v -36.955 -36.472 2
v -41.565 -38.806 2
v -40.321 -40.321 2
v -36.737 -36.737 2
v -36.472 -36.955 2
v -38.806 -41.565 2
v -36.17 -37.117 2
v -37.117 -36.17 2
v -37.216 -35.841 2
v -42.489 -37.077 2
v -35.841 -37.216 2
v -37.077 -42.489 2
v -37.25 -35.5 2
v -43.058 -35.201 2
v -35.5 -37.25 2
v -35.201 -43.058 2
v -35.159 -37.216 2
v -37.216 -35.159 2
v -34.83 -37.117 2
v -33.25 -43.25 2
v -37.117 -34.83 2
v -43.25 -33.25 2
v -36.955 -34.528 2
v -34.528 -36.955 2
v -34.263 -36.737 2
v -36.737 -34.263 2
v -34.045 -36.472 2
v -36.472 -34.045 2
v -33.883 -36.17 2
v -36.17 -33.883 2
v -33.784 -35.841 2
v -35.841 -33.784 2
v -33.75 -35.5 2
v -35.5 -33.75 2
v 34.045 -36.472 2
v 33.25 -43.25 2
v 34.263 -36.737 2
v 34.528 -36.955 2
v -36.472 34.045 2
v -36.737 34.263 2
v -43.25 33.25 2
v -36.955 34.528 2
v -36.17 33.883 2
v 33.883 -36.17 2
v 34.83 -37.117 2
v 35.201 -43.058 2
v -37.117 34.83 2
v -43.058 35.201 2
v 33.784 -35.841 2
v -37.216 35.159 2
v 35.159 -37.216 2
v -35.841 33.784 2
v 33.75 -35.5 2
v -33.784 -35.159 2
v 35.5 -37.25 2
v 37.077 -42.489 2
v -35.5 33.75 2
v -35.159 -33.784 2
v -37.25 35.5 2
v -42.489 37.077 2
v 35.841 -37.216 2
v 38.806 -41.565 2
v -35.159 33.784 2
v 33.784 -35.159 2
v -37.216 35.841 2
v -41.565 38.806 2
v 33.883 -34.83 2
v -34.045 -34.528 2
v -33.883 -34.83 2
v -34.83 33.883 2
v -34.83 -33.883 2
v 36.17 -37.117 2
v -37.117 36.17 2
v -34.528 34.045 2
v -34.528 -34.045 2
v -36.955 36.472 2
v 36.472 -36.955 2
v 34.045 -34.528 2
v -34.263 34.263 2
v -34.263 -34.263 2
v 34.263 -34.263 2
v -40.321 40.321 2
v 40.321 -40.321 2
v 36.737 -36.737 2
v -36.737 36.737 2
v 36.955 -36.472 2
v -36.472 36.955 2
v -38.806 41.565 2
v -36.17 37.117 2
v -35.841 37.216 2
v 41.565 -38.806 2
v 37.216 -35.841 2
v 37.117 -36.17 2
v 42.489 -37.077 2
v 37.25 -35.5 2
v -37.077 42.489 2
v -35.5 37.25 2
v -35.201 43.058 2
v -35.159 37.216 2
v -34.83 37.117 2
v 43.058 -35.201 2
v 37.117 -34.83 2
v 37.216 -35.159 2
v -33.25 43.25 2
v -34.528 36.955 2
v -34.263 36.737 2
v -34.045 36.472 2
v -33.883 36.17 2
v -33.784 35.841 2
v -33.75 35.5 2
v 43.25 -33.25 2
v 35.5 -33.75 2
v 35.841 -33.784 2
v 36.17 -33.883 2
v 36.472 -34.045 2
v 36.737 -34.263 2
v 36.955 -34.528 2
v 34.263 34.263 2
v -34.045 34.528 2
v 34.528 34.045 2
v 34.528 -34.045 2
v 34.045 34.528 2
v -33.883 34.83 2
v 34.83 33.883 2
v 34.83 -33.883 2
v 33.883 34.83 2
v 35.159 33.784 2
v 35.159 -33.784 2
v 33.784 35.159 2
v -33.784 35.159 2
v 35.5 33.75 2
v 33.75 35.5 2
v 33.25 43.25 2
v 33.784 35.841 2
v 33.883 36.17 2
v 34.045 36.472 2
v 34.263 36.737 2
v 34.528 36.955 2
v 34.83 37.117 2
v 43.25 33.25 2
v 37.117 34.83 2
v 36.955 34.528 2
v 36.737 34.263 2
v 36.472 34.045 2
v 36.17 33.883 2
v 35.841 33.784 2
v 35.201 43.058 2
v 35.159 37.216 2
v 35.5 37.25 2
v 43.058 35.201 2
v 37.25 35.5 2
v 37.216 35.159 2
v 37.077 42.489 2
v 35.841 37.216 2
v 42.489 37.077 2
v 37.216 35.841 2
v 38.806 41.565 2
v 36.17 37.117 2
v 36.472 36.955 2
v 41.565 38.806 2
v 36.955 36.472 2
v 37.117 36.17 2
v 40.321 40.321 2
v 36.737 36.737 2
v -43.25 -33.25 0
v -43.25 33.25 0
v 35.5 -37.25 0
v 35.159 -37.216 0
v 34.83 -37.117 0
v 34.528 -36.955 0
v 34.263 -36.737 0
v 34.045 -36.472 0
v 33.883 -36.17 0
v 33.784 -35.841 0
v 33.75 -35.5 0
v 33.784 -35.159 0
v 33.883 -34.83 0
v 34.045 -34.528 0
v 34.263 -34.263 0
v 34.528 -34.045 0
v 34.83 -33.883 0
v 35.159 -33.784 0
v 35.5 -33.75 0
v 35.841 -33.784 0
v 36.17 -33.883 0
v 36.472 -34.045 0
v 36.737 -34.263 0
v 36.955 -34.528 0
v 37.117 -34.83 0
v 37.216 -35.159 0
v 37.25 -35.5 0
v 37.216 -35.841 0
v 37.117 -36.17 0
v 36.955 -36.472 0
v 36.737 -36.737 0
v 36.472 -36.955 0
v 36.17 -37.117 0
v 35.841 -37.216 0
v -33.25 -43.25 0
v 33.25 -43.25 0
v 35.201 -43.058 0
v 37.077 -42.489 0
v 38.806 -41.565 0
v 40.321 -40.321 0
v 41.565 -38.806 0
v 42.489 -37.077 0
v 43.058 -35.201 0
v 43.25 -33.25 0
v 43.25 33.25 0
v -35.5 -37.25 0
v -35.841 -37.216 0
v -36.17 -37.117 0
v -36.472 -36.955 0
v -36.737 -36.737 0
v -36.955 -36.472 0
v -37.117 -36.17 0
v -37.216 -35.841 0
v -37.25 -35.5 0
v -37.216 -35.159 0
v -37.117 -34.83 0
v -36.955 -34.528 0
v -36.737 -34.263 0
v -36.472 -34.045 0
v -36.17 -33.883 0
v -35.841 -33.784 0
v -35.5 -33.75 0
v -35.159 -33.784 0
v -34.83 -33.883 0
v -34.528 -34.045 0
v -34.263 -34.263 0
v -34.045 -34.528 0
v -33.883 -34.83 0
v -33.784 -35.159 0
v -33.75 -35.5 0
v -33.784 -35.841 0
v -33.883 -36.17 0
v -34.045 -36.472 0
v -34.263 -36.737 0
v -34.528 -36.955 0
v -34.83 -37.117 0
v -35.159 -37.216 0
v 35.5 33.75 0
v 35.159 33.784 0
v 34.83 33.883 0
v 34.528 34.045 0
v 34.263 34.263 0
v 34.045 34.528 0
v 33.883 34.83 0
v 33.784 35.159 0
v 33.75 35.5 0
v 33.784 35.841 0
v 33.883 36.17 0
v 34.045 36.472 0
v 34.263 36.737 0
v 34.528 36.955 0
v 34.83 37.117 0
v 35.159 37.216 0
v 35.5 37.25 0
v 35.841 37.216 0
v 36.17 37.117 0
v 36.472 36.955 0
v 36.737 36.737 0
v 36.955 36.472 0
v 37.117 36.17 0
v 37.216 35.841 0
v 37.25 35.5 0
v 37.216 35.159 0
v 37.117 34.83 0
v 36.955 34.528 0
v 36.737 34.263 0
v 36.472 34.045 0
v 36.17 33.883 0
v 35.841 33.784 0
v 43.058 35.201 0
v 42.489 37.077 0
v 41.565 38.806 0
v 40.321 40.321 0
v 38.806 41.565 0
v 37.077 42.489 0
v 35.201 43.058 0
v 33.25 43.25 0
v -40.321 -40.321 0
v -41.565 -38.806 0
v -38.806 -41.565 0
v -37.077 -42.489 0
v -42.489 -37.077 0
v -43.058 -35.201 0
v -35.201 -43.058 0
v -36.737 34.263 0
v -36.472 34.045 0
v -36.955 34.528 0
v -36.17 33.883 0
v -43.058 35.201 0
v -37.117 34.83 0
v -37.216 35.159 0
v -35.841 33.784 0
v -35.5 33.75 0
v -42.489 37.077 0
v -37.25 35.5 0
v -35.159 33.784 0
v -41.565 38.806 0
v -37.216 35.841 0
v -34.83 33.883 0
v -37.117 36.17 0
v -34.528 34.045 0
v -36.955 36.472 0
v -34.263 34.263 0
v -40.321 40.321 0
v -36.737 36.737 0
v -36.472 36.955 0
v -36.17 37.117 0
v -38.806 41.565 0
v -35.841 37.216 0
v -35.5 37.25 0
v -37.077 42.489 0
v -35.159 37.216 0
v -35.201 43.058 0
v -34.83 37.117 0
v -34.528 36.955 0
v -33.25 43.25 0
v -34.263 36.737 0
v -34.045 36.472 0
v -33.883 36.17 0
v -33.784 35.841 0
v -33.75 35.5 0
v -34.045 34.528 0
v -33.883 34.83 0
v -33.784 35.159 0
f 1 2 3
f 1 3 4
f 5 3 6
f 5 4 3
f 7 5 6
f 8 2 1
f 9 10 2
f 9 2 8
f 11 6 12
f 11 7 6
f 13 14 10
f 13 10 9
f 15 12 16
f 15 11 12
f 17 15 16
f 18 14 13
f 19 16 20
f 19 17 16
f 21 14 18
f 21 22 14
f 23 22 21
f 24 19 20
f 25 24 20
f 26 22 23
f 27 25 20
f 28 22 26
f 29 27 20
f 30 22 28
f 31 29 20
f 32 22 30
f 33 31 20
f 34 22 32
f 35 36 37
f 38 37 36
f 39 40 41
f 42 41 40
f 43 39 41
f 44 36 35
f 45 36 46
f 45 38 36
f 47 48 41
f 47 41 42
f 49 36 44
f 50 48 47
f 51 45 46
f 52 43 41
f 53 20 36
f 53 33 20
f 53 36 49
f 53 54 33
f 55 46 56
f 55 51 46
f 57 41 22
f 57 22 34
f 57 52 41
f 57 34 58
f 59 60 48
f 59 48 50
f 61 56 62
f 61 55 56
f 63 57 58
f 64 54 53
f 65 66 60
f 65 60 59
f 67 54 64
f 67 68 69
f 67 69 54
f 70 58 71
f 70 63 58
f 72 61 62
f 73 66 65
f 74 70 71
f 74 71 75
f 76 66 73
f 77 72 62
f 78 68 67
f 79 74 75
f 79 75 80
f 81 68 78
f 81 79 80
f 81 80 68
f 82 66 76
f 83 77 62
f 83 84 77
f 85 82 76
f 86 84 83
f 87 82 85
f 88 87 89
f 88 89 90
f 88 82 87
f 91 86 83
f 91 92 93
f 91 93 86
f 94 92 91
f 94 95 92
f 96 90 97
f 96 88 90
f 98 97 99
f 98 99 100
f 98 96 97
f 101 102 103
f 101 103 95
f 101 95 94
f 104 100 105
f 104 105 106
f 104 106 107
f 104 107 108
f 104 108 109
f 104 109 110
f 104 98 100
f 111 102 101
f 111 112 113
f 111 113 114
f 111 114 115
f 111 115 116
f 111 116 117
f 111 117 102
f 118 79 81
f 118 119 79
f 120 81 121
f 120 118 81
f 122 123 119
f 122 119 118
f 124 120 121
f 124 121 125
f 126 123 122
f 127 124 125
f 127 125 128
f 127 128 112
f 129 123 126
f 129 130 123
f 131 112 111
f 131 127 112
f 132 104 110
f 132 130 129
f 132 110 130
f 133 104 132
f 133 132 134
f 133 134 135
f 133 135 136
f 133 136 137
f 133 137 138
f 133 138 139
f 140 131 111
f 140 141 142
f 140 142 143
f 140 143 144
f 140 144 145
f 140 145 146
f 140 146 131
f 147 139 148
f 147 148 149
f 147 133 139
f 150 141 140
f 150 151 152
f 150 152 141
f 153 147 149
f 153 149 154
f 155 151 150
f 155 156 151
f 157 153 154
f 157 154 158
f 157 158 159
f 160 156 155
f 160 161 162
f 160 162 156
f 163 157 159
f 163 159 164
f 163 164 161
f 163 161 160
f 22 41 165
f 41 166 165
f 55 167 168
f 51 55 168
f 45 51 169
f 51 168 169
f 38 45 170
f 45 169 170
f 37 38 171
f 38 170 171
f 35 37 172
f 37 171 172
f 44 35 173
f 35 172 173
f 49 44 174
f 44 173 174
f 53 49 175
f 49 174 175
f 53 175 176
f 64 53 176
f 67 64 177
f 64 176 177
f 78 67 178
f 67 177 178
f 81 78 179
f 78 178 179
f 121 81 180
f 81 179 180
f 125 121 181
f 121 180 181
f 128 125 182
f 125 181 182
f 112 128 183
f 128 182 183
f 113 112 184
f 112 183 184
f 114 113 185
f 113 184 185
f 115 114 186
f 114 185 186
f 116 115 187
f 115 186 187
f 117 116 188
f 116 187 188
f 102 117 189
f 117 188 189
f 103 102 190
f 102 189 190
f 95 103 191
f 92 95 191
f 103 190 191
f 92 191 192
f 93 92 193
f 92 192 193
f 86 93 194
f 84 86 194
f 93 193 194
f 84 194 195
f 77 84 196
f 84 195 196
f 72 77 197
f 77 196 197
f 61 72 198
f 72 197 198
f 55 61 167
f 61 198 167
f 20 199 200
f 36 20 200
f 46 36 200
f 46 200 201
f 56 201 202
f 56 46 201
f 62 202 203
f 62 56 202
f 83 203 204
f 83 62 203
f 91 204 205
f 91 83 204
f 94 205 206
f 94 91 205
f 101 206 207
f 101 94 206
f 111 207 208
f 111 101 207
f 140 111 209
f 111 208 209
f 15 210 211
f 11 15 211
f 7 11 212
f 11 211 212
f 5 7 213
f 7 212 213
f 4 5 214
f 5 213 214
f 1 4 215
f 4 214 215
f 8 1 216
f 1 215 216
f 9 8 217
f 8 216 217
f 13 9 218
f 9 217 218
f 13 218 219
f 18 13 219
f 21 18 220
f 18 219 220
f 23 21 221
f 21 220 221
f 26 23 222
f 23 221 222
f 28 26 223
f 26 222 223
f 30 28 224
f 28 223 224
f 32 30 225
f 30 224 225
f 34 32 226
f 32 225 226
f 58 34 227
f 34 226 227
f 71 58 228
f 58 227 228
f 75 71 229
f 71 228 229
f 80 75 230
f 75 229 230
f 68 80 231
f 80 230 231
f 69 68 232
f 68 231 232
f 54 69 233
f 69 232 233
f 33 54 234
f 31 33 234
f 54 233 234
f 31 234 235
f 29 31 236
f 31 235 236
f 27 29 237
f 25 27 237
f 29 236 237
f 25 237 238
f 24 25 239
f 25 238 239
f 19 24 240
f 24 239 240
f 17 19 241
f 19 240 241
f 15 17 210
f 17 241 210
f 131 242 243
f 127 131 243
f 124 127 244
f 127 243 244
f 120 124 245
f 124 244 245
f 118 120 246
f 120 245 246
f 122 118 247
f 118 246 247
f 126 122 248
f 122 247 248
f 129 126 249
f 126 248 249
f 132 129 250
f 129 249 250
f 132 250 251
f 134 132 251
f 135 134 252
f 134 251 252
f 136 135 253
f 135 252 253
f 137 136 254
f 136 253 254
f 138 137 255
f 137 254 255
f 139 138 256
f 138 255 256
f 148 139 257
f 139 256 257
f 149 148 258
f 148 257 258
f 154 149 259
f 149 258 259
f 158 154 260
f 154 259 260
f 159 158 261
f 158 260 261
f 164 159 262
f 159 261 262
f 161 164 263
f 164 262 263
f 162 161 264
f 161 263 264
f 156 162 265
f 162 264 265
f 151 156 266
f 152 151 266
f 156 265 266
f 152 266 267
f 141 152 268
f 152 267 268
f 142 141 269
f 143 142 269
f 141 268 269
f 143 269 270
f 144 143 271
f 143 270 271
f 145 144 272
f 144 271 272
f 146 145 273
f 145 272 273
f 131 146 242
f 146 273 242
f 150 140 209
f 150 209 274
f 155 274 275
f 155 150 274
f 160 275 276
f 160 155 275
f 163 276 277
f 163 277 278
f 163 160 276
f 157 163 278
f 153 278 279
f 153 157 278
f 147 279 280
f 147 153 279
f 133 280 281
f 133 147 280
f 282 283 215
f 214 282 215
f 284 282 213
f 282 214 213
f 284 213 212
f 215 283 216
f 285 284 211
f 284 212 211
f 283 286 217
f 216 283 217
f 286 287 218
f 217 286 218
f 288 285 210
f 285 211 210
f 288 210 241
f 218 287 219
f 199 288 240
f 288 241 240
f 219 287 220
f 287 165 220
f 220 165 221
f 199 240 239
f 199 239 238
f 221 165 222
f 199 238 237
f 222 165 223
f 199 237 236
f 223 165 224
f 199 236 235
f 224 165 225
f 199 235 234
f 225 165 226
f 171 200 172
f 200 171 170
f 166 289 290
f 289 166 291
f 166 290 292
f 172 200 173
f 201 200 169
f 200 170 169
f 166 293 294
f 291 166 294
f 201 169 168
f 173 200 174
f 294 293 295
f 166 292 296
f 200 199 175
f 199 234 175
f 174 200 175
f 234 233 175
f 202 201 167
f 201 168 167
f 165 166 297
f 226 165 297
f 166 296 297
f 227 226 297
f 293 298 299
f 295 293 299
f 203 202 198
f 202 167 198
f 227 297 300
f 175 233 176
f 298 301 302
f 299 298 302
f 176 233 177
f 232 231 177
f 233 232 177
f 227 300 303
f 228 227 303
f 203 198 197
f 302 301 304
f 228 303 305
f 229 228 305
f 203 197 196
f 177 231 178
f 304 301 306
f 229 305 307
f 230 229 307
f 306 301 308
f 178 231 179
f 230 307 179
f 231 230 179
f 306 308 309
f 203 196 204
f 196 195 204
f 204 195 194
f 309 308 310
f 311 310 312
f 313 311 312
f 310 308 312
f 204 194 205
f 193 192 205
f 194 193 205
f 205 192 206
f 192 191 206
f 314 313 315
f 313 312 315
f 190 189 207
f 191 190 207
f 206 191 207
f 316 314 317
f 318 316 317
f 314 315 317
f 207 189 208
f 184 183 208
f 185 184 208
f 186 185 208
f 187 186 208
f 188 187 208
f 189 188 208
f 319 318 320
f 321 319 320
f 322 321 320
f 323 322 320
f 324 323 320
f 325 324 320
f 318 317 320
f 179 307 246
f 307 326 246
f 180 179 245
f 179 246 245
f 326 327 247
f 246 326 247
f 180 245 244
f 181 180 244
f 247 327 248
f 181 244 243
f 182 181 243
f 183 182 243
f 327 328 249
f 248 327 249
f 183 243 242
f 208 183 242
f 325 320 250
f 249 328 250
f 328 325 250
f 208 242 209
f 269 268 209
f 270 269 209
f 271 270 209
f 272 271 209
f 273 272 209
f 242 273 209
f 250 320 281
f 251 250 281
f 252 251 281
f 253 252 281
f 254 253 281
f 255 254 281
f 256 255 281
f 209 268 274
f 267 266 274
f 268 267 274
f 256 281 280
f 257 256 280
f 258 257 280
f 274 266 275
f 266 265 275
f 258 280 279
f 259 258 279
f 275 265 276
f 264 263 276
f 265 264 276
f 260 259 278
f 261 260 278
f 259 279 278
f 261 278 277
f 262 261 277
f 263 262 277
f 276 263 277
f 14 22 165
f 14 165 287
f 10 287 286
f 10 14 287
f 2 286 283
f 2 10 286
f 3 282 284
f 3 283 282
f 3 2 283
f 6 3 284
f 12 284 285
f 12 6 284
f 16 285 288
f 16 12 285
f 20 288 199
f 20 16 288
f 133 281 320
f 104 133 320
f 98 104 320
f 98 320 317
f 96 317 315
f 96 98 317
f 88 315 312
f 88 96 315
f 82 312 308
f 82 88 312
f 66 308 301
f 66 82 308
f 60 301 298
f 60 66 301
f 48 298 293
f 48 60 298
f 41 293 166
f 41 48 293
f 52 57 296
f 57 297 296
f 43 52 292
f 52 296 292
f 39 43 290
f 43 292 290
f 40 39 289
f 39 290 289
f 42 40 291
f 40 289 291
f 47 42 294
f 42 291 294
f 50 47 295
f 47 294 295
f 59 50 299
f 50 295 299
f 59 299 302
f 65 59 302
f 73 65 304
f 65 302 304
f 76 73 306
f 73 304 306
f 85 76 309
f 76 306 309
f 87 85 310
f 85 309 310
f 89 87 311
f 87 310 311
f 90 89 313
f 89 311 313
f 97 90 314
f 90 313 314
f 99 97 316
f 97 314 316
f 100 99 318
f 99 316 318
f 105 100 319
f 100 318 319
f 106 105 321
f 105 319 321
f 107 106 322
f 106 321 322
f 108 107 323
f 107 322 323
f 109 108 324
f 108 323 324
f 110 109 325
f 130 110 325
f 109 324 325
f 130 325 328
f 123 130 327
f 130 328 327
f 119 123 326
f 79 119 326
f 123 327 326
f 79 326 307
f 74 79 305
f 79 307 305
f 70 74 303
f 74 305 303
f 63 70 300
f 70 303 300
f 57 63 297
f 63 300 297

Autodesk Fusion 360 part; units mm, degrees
sketch "Sketch1" plane through (0, 0, 0) normal (0, 0, 1) x (1, 0, 0)
  line L0 (43.25, 43.25) -> (-43.25, 43.25)
  line L1 (-43.25, 43.25) -> (-43.25, -43.25)
  line L2 (-43.25, -43.25) -> (43.25, -43.25)
  line L3 (43.25, -43.25) -> (43.25, 43.25)
  line L4 (43.25, 43.25) -> (-43.25, -43.25) construction
  line L5 (-43.25, 43.25) -> (43.25, -43.25) construction
  dimension "d17" = 86.5
  dimension "d18" = 86.5
extrude "Extrude1" add sketch "Sketch1" along normal blind 2
fillet "Fillet1" radius 10 1 edges at (-43.25, -43.25, 1)
fillet "Fillet2" radius 10 1 edges at (43.25, -43.25, 1)
fillet "Fillet3" radius 10 1 edges at (43.25, 43.25, 1)
fillet "Fillet4" radius 10 1 edges at (-43.25, 43.25, 1)
sketch "Sketch2" plane through (0, 0, 2) normal (0, 0, 1) x (-1, 0, 0)
  arc A0 (33.25, -43.25) -> (43.25, -33.25) centre (33.25, -33.25) ccw
  line L0 (43.25, -33.25) -> (43.25, 33.25)
  arc A1 (43.25, 33.25) -> (33.25, 43.25) centre (33.25, 33.25) ccw
  line L1 (33.25, 43.25) -> (-33.25, 43.25)
  arc A2 (-33.25, 43.25) -> (-43.25, 33.25) centre (-33.25, 33.25) ccw
  line L2 (-43.25, 33.25) -> (-43.25, -33.25)
  arc A3 (-43.25, -33.25) -> (-33.25, -43.25) centre (-33.25, -33.25) ccw
  line L3 (-33.25, -43.25) -> (33.25, -43.25)
  point P0 (35.5, -35.5)
  point P1 (-35.5, -35.5)
  point P2 (-35.5, 35.5)
  point P3 (35.5, 35.5)
  dimension "d25" = 35.5
  dimension "d26" = 35.5
  dimension "d27" = 71
  dimension "d28" = 71
hole "Hole1" at (-35.5, 35.5, 2) at (35.5, 35.5, 2) at (35.5, -35.5, 2) at (-35.5, -35.5, 2) direction (0, 0, -1) diameter 3.5 depth 30 tip angle 118
